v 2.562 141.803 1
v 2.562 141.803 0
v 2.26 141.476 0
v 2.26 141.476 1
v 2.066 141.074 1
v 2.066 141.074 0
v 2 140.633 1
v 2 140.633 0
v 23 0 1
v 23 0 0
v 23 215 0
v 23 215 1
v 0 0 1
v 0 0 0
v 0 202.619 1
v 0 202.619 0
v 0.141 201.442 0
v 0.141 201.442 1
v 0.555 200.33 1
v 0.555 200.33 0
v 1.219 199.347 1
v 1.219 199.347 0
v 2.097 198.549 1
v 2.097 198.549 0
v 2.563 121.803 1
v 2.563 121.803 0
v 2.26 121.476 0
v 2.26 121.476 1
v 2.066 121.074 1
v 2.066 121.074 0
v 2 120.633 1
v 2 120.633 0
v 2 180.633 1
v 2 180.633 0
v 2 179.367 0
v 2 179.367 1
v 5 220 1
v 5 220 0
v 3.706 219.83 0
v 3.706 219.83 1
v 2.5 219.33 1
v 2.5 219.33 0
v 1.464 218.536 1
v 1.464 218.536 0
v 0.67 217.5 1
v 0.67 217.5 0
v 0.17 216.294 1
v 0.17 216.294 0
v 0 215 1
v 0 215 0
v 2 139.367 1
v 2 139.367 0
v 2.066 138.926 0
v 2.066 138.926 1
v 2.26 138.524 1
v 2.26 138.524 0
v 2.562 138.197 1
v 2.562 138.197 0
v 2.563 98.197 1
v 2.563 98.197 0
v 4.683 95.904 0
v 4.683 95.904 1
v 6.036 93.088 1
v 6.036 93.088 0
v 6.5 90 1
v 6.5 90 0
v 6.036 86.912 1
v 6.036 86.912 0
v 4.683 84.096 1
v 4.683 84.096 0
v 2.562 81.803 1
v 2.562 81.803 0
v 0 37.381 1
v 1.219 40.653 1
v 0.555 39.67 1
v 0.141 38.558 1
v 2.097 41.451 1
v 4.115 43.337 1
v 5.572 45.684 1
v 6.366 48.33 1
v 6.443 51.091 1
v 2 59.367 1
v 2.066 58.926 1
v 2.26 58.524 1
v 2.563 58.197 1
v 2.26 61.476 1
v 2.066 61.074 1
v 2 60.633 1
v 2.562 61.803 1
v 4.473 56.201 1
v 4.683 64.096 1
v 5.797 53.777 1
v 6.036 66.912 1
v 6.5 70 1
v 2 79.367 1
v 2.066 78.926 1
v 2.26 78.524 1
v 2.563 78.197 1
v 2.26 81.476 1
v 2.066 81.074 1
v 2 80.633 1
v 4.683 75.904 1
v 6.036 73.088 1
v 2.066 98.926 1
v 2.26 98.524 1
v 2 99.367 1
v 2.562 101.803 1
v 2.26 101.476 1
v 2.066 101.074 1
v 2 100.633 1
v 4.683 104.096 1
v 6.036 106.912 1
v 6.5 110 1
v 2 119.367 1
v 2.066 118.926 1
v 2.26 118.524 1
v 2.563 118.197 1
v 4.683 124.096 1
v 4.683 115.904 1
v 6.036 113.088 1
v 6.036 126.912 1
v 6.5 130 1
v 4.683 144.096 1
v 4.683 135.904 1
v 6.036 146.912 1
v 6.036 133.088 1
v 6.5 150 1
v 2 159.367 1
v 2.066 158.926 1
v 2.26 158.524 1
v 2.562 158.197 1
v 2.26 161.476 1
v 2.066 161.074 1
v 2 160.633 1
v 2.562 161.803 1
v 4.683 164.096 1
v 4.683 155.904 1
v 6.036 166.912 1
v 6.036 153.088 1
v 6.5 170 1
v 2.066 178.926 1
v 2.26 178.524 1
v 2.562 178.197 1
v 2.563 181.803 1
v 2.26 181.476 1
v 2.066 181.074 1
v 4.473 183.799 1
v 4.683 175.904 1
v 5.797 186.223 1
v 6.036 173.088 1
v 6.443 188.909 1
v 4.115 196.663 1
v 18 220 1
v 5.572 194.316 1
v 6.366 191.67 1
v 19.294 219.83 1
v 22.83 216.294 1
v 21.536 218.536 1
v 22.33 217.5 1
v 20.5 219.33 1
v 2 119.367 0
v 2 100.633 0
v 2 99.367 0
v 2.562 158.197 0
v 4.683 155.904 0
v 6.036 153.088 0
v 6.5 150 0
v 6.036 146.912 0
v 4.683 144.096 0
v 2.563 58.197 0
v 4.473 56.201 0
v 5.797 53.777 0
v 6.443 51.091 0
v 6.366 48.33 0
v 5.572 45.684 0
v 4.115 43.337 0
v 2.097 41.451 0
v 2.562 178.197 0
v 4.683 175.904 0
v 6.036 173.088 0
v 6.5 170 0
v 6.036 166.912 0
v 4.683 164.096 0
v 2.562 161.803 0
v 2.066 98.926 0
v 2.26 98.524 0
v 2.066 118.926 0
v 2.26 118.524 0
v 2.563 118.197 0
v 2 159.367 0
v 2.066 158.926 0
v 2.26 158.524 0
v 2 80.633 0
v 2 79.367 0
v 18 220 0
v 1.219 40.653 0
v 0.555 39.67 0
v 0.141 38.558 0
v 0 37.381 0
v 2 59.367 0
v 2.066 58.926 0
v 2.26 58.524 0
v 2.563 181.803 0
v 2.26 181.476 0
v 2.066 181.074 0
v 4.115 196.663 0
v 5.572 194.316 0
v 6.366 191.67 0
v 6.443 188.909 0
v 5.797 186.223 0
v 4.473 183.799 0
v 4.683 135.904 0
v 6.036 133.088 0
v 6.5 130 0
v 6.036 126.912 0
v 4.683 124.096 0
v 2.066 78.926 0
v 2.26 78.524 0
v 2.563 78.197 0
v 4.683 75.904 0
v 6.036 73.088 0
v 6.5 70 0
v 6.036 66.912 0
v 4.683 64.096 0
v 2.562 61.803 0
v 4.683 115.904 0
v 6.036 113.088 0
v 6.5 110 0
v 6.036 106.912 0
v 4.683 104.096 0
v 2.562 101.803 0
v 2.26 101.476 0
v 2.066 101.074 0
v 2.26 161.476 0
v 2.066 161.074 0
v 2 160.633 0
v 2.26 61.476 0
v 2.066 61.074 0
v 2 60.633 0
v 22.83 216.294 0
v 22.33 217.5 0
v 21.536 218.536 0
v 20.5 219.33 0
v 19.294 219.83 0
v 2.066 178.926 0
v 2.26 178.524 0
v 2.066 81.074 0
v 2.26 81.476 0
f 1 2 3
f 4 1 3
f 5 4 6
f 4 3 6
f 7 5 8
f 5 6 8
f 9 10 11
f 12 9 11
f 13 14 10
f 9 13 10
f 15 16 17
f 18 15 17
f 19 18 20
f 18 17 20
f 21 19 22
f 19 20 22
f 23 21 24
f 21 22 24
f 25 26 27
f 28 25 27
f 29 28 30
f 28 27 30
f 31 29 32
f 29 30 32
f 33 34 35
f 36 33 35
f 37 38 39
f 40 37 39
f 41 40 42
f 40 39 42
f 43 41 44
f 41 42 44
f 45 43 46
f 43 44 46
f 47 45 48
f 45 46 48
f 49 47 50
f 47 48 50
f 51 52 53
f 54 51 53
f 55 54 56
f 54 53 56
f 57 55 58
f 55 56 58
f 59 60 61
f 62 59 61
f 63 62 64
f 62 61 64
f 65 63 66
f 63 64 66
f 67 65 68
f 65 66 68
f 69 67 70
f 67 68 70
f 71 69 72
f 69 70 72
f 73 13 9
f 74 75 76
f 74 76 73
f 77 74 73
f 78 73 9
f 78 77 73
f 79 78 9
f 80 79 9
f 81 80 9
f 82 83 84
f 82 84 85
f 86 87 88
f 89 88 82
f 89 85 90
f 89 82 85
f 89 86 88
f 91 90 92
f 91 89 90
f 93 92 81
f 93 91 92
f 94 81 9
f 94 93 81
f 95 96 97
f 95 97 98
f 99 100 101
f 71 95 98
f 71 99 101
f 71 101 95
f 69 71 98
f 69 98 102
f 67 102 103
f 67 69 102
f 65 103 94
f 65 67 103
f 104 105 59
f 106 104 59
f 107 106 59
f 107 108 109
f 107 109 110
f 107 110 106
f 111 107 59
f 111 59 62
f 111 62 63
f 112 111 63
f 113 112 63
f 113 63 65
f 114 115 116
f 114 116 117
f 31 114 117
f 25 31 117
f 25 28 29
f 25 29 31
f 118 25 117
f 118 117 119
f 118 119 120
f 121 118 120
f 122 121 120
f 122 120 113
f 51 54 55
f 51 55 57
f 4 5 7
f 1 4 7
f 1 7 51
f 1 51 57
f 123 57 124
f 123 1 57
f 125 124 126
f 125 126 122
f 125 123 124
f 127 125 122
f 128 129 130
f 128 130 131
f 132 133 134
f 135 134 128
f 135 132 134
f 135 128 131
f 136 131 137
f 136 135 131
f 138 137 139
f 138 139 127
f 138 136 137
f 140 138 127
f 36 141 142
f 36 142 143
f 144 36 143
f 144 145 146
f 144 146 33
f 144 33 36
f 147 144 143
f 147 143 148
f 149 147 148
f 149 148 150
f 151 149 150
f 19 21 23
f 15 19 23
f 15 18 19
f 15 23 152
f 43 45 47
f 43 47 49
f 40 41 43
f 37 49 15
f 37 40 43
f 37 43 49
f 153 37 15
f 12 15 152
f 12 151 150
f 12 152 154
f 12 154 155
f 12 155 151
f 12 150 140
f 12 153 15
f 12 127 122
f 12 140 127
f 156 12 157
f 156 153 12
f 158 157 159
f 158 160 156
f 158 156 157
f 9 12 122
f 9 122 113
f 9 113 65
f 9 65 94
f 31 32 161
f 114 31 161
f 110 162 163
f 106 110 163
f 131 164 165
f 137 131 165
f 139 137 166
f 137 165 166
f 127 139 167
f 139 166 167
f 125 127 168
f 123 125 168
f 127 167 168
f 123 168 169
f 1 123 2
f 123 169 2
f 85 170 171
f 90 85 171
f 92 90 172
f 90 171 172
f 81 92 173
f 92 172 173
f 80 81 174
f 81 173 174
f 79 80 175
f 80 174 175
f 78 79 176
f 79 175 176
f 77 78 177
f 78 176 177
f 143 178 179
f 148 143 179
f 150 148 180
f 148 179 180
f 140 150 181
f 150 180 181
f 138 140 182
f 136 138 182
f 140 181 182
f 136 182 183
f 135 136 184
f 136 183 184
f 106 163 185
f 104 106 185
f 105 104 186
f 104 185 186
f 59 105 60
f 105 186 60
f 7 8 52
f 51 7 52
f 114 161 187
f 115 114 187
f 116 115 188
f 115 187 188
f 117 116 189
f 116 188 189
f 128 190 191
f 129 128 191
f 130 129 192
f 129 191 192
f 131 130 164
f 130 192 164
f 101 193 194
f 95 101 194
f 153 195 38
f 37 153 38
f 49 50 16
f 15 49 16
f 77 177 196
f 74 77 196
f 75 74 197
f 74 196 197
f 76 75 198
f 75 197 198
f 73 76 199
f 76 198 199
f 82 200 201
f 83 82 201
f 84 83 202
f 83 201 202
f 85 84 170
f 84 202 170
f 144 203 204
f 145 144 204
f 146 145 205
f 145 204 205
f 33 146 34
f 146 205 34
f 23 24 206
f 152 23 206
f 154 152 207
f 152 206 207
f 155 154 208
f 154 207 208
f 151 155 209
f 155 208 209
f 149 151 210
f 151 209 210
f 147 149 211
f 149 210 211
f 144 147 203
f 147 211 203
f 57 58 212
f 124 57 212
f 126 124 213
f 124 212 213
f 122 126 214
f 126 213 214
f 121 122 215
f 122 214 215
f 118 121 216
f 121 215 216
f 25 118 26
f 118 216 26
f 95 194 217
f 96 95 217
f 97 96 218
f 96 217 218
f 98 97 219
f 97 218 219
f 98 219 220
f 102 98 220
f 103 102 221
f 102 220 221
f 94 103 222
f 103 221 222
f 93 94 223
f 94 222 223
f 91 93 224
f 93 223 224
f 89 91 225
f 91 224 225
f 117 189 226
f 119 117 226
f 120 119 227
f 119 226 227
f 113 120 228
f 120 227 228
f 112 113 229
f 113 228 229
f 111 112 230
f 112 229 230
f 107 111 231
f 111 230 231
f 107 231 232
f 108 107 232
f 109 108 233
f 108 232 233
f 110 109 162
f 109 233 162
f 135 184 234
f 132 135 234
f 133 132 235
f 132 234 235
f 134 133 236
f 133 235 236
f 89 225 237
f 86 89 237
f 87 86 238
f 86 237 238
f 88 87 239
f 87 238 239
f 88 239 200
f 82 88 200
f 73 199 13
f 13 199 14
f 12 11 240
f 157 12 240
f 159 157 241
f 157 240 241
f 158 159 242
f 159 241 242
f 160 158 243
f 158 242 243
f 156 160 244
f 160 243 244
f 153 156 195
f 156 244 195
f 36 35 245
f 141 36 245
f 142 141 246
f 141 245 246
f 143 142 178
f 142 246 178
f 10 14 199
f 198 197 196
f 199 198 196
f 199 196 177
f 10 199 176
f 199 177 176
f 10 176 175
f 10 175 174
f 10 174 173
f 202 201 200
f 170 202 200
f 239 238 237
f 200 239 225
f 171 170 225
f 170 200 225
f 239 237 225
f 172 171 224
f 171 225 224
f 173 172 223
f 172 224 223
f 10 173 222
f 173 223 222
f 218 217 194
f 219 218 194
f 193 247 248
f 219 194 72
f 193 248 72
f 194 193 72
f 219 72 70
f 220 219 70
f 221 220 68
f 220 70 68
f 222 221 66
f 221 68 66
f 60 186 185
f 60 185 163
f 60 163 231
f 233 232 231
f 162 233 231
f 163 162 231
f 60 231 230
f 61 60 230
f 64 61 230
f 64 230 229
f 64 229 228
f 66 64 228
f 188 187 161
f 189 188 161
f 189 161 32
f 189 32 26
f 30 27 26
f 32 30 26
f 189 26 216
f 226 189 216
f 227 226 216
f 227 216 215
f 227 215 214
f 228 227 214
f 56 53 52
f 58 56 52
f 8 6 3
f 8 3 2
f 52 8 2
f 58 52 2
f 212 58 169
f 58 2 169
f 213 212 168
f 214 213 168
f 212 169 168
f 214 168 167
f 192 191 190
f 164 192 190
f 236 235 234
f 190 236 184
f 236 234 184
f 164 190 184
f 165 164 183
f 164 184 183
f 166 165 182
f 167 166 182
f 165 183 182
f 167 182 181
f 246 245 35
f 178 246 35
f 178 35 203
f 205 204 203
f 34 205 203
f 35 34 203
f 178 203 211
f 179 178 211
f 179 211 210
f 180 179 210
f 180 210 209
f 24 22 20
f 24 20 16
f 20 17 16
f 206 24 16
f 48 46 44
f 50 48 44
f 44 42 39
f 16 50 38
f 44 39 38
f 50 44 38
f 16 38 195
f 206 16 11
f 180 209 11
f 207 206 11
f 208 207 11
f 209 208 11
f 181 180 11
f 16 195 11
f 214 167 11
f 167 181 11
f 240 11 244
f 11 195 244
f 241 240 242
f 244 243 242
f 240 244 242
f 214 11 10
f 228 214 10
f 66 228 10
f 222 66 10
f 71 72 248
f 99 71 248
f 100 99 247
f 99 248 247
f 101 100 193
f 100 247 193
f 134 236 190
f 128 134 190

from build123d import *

# Parameters (mm, degrees)
BOSS_EXTRUDE1_DEPTH = 1


with BuildPart() as part:
    # Sketch1 → Boss-Extrude1 (new body)
    with BuildSketch(Plane.XY):
        with BuildLine():
            Line((0, 0), (23, 0))
            Line((23, 0), (23, 215))
            ThreePointArc((23, 215), (21.535533906, 218.535533906), (18, 220))
            Line((18, 220), (5, 220))
            ThreePointArc((5, 220), (1.464466094, 218.535533906), (0, 215))
            Line((0, 215), (0, 202.619429464))
            ThreePointArc((0, 202.619429464), (0.554995555, 200.329902115), (2.096774194, 198.548645766))
            ThreePointArc((2.096774194, 198.548645766), (6.495941299, 190.291918226), (2.5625, 181.803440127))
            ThreePointArc((2.5625, 181.803440127), (2.147918272, 181.282022055), (2, 180.632503002))
            Line((2, 180.632503002), (2, 179.367496998))
            ThreePointArc((2, 179.367496998), (2.147918272, 178.717977945), (2.5625, 178.196559873))
            ThreePointArc((2.5625, 178.196559873), (6.5, 170), (2.5625, 161.803440127))
            ThreePointArc((2.5625, 161.803440127), (2.147918272, 161.282022055), (2, 160.632503002))
            Line((2, 160.632503002), (2, 159.367496998))
            ThreePointArc((2, 159.367496998), (2.147918272, 158.717977945), (2.5625, 158.196559873))
            ThreePointArc((2.5625, 158.196559873), (6.5, 150), (2.5625, 141.803440127))
            ThreePointArc((2.5625, 141.803440127), (2.147918272, 141.282022055), (2, 140.632503002))
            Line((2, 140.632503002), (2, 139.367496998))
            ThreePointArc((2, 139.367496998), (2.147918272, 138.717977945), (2.5625, 138.196559873))
            ThreePointArc((2.5625, 138.196559873), (6.5, 130), (2.5625, 121.803440127))
            ThreePointArc((2.5625, 121.803440127), (2.147918272, 121.282022055), (2, 120.632503002))
            Line((2, 120.632503002), (2, 119.367496998))
            ThreePointArc((2, 119.367496998), (2.147918272, 118.717977945), (2.5625, 118.196559873))
            ThreePointArc((2.5625, 118.196559873), (6.5, 110), (2.5625, 101.803440127))
            ThreePointArc((2.5625, 101.803440127), (2.147918272, 101.282022055), (2, 100.632503002))
            Line((2, 100.632503002), (2, 99.367496998))
            ThreePointArc((2, 99.367496998), (2.147918272, 98.717977945), (2.5625, 98.196559873))
            ThreePointArc((2.5625, 98.196559873), (6.5, 90), (2.5625, 81.803440127))
            ThreePointArc((2.5625, 81.803440127), (2.147918272, 81.282022055), (2, 80.632503002))
            Line((2, 80.632503002), (2, 79.367496998))
            ThreePointArc((2, 79.367496998), (2.147918272, 78.717977945), (2.5625, 78.196559873))
            ThreePointArc((2.5625, 78.196559873), (6.5, 70), (2.5625, 61.803440127))
            ThreePointArc((2.5625, 61.803440127), (2.147918272, 61.282022055), (2, 60.632503002))
            Line((2, 60.632503002), (2, 59.367496998))
            ThreePointArc((2, 59.367496998), (2.147918272, 58.717977945), (2.5625, 58.196559873))
            ThreePointArc((2.5625, 58.196559873), (6.495941299, 49.708081774), (2.096774194, 41.451354234))
            ThreePointArc((2.096774194, 41.451354234), (0.554995555, 39.670097885), (0, 37.380570536))
            Line((0, 37.380570536), (0, 0))
        make_face()
    extrude(amount=BOSS_EXTRUDE1_DEPTH)


solid = part.part
